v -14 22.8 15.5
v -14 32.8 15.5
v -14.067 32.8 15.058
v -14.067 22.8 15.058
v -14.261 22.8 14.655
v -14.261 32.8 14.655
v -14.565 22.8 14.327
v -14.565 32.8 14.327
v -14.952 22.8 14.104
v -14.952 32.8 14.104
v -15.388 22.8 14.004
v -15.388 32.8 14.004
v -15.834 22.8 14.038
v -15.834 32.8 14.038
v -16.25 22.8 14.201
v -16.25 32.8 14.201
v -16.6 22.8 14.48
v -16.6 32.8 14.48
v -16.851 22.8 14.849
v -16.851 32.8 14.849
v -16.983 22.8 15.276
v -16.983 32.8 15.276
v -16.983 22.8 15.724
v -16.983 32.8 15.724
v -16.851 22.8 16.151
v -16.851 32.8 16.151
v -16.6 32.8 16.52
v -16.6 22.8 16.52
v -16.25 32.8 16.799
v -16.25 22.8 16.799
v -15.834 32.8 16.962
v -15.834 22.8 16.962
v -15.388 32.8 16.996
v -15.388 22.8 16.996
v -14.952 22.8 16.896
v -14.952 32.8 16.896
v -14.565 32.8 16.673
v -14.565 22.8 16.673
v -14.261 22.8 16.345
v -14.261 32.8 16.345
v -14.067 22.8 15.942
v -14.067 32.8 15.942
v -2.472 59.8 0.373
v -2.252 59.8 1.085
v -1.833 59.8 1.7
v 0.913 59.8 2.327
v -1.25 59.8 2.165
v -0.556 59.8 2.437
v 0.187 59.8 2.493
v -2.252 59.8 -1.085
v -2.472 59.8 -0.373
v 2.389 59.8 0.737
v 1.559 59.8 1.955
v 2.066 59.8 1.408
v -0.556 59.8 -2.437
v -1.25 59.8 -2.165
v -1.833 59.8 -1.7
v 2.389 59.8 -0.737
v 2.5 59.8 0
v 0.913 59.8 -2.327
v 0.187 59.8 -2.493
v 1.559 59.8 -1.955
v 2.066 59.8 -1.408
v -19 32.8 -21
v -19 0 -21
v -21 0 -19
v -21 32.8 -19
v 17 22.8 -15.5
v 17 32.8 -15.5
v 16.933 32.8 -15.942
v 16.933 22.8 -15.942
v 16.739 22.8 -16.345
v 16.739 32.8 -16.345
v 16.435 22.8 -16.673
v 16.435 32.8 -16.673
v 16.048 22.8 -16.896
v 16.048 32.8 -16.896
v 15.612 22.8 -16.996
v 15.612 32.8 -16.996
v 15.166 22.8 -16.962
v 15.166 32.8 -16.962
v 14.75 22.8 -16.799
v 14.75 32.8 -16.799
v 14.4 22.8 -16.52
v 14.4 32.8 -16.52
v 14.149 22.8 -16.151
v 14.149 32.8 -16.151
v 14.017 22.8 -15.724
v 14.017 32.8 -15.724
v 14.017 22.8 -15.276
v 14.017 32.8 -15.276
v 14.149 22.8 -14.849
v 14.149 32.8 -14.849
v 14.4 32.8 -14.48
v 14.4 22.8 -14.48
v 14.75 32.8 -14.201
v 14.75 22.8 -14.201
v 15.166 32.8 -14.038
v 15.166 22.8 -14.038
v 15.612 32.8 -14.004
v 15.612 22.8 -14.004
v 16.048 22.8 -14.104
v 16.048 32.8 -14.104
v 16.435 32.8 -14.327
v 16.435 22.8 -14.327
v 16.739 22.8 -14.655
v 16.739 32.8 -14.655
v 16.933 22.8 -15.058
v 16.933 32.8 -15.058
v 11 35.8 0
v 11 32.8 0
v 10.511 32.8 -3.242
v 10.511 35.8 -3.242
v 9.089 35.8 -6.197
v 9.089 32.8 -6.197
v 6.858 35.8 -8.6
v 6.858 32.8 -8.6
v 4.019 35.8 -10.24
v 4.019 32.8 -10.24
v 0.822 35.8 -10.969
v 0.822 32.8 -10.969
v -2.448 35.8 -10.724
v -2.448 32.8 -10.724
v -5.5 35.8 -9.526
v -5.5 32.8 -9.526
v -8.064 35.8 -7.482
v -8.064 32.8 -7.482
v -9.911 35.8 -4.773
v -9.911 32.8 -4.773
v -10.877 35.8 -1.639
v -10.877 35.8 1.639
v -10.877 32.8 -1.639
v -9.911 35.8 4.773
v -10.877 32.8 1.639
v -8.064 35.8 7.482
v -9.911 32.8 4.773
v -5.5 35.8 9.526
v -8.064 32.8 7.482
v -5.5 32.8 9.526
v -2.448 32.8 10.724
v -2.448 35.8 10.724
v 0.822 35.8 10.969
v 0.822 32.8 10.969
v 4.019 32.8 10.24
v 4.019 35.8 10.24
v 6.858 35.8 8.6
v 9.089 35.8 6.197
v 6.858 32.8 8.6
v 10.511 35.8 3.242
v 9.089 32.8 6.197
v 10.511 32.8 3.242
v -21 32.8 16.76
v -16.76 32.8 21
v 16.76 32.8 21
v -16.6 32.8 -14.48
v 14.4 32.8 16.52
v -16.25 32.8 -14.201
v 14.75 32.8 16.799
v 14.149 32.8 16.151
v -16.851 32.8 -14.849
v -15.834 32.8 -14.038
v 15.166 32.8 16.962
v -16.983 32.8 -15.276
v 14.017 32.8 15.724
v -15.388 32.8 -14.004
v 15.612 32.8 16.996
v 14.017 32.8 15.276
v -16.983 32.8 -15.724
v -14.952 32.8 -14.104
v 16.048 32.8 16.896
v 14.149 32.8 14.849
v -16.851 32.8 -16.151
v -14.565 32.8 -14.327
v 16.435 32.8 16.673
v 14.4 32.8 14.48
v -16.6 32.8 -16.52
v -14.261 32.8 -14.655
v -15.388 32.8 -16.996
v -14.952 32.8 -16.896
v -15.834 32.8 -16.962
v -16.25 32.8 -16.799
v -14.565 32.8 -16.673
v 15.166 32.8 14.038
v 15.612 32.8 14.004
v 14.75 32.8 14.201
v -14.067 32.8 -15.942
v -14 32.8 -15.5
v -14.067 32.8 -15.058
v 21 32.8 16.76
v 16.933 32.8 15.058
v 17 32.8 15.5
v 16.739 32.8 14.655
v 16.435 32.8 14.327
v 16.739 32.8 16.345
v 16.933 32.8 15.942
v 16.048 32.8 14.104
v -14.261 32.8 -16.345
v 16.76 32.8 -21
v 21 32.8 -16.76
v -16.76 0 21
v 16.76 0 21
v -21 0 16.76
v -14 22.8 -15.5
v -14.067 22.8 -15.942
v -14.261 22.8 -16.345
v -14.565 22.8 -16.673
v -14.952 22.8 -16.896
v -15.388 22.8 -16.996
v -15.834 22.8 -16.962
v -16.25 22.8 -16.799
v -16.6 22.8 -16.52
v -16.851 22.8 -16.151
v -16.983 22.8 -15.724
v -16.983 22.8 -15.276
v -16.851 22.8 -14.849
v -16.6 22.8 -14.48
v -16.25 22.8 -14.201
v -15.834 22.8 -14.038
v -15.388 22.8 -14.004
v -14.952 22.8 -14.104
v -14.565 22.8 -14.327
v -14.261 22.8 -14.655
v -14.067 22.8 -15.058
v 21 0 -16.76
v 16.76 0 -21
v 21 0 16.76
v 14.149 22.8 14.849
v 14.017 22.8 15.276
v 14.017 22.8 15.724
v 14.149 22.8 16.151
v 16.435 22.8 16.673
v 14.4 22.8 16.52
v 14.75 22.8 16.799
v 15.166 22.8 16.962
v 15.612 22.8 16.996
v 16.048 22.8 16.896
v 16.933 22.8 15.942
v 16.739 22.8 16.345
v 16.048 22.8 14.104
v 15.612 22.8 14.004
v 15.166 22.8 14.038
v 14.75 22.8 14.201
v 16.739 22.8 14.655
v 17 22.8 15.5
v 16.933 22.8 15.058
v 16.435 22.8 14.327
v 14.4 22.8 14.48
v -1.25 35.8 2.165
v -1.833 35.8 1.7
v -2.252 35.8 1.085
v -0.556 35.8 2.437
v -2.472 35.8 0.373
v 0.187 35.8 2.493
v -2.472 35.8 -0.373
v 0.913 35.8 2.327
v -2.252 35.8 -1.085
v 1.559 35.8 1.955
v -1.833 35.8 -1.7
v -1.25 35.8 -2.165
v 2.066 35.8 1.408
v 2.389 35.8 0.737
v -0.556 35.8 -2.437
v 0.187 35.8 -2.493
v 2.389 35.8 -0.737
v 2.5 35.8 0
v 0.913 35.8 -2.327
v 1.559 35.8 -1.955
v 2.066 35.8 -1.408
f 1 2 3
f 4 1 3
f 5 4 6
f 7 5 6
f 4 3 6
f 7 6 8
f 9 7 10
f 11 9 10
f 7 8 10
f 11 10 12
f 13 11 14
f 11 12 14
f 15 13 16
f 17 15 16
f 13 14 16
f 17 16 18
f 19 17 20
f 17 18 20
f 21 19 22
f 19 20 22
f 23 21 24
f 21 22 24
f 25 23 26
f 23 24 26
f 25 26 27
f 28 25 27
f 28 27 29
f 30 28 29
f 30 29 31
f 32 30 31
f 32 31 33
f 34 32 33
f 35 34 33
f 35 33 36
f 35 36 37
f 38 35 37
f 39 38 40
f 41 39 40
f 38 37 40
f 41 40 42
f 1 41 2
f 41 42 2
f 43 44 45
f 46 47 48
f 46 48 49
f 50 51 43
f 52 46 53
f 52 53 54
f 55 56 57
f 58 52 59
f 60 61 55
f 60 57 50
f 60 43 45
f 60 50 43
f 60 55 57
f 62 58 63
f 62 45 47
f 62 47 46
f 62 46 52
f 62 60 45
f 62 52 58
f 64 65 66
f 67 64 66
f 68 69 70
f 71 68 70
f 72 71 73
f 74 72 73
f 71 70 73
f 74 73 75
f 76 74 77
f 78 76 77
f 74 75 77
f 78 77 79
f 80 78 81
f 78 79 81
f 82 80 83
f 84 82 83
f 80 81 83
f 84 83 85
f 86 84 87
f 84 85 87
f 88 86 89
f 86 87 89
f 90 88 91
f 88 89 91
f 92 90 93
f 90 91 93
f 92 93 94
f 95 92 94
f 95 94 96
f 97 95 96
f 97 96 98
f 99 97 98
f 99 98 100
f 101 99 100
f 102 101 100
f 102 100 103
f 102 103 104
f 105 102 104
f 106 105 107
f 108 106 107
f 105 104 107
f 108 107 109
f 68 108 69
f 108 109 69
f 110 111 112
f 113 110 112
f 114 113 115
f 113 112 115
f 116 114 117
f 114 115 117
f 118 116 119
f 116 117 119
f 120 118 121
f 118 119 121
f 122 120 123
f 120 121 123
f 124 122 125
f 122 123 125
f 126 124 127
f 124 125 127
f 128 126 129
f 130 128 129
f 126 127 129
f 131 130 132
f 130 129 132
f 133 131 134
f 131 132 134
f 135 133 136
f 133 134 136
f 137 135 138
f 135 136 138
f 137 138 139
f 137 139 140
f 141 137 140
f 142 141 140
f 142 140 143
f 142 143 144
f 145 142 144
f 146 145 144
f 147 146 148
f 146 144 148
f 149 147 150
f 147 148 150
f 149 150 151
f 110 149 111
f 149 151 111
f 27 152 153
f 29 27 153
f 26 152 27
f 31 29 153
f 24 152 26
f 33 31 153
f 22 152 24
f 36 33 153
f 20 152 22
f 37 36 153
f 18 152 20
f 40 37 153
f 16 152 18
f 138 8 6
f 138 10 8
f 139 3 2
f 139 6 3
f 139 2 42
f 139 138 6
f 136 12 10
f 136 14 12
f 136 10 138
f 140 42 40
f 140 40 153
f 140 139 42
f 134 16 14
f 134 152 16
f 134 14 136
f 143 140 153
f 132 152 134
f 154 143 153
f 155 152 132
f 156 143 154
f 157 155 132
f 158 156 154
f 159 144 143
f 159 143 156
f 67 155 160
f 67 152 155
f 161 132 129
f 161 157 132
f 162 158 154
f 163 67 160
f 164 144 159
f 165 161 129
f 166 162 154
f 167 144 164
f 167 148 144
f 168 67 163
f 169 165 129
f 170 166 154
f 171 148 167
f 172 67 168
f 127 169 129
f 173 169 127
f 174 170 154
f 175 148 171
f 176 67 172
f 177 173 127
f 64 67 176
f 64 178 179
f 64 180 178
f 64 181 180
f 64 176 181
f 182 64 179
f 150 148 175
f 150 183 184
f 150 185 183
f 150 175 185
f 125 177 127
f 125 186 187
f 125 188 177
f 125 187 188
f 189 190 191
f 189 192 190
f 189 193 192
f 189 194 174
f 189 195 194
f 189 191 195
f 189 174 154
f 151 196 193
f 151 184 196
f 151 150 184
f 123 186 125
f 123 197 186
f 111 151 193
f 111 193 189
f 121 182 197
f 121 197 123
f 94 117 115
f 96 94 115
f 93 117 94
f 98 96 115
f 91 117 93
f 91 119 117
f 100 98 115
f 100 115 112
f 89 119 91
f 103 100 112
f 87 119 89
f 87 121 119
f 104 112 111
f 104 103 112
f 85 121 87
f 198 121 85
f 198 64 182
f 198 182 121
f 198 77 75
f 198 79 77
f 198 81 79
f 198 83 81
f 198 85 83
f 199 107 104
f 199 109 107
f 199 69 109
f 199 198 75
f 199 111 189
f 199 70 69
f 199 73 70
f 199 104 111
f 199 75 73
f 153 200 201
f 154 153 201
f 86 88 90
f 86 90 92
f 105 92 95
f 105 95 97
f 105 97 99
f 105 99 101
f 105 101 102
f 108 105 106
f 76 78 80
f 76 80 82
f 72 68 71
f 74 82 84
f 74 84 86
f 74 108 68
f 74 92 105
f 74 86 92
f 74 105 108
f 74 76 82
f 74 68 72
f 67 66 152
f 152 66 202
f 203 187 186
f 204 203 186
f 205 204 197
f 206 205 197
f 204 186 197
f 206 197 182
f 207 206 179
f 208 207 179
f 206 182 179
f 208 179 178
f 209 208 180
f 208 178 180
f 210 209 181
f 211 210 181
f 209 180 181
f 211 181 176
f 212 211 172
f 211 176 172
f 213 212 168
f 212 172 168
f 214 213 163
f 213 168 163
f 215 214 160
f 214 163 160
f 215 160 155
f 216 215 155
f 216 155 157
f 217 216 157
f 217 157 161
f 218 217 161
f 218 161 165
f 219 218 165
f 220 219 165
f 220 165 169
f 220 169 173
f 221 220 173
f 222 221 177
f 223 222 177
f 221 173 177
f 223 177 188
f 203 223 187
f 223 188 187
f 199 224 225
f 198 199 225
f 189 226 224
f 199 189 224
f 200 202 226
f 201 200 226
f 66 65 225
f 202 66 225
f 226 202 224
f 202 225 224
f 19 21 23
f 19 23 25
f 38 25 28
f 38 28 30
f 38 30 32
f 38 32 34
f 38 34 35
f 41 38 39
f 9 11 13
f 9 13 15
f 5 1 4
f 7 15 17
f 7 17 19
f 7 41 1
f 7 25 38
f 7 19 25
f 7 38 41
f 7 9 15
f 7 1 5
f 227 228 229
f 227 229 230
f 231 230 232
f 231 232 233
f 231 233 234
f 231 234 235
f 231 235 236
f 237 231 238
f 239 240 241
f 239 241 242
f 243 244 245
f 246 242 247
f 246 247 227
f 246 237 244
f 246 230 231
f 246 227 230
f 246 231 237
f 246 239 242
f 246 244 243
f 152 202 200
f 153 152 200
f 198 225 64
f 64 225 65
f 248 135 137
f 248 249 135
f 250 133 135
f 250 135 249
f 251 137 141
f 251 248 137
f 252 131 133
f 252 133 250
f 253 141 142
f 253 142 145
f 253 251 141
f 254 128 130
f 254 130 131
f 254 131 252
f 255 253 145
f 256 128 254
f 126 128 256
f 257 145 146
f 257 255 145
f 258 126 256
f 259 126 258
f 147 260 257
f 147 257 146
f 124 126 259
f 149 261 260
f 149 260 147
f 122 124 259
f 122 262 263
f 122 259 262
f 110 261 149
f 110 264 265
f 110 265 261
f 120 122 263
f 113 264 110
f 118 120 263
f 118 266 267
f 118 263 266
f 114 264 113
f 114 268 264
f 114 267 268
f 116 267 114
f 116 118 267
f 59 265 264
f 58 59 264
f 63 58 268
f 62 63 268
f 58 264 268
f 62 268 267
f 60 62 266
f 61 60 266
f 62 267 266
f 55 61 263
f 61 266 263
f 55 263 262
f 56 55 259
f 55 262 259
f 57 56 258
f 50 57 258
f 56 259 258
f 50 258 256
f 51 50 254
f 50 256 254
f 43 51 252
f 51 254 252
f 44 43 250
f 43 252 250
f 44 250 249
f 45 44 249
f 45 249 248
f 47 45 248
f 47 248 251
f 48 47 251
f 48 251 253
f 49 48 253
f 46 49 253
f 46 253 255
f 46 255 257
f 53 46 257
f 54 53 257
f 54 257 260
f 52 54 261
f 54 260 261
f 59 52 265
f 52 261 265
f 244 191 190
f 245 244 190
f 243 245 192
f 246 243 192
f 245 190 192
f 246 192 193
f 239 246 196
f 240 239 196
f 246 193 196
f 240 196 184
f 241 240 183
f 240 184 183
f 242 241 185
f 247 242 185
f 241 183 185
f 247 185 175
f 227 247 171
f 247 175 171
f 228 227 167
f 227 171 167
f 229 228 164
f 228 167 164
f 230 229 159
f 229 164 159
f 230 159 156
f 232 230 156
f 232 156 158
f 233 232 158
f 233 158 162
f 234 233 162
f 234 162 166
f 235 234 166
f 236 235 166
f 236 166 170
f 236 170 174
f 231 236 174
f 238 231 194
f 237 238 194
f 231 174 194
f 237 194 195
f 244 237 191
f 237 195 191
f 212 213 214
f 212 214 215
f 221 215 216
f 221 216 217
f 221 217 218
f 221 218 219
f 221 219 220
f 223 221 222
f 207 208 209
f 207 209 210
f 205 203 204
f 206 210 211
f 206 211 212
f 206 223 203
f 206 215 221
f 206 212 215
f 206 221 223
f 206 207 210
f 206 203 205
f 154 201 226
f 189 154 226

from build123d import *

# Parameters (mm, degrees)
BOSS_EXTRUDE1_DEPTH = 32.8
SKETCH2_R           = 1.5
CUT_EXTRUDE1_DEPTH  = 10
SKETCH3_R           = 11
BOSS_EXTRUDE2_DEPTH = 3
SKETCH4_R           = 2.5
BOSS_EXTRUDE3_DEPTH = 24


with BuildPart() as part:
    # Sketch1 → Boss-Extrude1 (new body)
    with BuildSketch(Plane(origin=(0, 0, 0), x_dir=(1, 0, 0), z_dir=(0, 1, 0))):
        Polygon((-19, 21), (-21, 19), (-21, -16.76), (-16.76, -21), (16.76, -21), (21, -16.76), (21, 16.76), (16.76, 21), align=None)
    extrude(amount=BOSS_EXTRUDE1_DEPTH)

    # Sketch2 → Cut-Extrude1 (cut)
    with BuildSketch(Plane(origin=(0, 32.8, 0), x_dir=(1, 0, 0), z_dir=(0, 1, 0))):
        with Locations((15.5, 15.5)):
            Circle(SKETCH2_R)
        with Locations((15.5, -15.5)):
            Circle(SKETCH2_R)
        with Locations((-15.5, -15.5)):
            Circle(SKETCH2_R)
        with Locations((-15.5, 15.5)):
            Circle(SKETCH2_R)
    extrude(amount=-CUT_EXTRUDE1_DEPTH, mode=Mode.SUBTRACT)

    # Sketch3 → Boss-Extrude2 (add)
    with BuildSketch(Plane(origin=(0, 32.8, 0), x_dir=(1, 0, 0), z_dir=(0, 1, 0))):
        Circle(SKETCH3_R)
    extrude(amount=BOSS_EXTRUDE2_DEPTH)

    # Sketch4 → Boss-Extrude3 (add)
    with BuildSketch(Plane(origin=(0, 35.8, 0), x_dir=(1, 0, 0), z_dir=(0, 1, 0))):
        Circle(SKETCH4_R)
    extrude(amount=BOSS_EXTRUDE3_DEPTH)


solid = part.part
